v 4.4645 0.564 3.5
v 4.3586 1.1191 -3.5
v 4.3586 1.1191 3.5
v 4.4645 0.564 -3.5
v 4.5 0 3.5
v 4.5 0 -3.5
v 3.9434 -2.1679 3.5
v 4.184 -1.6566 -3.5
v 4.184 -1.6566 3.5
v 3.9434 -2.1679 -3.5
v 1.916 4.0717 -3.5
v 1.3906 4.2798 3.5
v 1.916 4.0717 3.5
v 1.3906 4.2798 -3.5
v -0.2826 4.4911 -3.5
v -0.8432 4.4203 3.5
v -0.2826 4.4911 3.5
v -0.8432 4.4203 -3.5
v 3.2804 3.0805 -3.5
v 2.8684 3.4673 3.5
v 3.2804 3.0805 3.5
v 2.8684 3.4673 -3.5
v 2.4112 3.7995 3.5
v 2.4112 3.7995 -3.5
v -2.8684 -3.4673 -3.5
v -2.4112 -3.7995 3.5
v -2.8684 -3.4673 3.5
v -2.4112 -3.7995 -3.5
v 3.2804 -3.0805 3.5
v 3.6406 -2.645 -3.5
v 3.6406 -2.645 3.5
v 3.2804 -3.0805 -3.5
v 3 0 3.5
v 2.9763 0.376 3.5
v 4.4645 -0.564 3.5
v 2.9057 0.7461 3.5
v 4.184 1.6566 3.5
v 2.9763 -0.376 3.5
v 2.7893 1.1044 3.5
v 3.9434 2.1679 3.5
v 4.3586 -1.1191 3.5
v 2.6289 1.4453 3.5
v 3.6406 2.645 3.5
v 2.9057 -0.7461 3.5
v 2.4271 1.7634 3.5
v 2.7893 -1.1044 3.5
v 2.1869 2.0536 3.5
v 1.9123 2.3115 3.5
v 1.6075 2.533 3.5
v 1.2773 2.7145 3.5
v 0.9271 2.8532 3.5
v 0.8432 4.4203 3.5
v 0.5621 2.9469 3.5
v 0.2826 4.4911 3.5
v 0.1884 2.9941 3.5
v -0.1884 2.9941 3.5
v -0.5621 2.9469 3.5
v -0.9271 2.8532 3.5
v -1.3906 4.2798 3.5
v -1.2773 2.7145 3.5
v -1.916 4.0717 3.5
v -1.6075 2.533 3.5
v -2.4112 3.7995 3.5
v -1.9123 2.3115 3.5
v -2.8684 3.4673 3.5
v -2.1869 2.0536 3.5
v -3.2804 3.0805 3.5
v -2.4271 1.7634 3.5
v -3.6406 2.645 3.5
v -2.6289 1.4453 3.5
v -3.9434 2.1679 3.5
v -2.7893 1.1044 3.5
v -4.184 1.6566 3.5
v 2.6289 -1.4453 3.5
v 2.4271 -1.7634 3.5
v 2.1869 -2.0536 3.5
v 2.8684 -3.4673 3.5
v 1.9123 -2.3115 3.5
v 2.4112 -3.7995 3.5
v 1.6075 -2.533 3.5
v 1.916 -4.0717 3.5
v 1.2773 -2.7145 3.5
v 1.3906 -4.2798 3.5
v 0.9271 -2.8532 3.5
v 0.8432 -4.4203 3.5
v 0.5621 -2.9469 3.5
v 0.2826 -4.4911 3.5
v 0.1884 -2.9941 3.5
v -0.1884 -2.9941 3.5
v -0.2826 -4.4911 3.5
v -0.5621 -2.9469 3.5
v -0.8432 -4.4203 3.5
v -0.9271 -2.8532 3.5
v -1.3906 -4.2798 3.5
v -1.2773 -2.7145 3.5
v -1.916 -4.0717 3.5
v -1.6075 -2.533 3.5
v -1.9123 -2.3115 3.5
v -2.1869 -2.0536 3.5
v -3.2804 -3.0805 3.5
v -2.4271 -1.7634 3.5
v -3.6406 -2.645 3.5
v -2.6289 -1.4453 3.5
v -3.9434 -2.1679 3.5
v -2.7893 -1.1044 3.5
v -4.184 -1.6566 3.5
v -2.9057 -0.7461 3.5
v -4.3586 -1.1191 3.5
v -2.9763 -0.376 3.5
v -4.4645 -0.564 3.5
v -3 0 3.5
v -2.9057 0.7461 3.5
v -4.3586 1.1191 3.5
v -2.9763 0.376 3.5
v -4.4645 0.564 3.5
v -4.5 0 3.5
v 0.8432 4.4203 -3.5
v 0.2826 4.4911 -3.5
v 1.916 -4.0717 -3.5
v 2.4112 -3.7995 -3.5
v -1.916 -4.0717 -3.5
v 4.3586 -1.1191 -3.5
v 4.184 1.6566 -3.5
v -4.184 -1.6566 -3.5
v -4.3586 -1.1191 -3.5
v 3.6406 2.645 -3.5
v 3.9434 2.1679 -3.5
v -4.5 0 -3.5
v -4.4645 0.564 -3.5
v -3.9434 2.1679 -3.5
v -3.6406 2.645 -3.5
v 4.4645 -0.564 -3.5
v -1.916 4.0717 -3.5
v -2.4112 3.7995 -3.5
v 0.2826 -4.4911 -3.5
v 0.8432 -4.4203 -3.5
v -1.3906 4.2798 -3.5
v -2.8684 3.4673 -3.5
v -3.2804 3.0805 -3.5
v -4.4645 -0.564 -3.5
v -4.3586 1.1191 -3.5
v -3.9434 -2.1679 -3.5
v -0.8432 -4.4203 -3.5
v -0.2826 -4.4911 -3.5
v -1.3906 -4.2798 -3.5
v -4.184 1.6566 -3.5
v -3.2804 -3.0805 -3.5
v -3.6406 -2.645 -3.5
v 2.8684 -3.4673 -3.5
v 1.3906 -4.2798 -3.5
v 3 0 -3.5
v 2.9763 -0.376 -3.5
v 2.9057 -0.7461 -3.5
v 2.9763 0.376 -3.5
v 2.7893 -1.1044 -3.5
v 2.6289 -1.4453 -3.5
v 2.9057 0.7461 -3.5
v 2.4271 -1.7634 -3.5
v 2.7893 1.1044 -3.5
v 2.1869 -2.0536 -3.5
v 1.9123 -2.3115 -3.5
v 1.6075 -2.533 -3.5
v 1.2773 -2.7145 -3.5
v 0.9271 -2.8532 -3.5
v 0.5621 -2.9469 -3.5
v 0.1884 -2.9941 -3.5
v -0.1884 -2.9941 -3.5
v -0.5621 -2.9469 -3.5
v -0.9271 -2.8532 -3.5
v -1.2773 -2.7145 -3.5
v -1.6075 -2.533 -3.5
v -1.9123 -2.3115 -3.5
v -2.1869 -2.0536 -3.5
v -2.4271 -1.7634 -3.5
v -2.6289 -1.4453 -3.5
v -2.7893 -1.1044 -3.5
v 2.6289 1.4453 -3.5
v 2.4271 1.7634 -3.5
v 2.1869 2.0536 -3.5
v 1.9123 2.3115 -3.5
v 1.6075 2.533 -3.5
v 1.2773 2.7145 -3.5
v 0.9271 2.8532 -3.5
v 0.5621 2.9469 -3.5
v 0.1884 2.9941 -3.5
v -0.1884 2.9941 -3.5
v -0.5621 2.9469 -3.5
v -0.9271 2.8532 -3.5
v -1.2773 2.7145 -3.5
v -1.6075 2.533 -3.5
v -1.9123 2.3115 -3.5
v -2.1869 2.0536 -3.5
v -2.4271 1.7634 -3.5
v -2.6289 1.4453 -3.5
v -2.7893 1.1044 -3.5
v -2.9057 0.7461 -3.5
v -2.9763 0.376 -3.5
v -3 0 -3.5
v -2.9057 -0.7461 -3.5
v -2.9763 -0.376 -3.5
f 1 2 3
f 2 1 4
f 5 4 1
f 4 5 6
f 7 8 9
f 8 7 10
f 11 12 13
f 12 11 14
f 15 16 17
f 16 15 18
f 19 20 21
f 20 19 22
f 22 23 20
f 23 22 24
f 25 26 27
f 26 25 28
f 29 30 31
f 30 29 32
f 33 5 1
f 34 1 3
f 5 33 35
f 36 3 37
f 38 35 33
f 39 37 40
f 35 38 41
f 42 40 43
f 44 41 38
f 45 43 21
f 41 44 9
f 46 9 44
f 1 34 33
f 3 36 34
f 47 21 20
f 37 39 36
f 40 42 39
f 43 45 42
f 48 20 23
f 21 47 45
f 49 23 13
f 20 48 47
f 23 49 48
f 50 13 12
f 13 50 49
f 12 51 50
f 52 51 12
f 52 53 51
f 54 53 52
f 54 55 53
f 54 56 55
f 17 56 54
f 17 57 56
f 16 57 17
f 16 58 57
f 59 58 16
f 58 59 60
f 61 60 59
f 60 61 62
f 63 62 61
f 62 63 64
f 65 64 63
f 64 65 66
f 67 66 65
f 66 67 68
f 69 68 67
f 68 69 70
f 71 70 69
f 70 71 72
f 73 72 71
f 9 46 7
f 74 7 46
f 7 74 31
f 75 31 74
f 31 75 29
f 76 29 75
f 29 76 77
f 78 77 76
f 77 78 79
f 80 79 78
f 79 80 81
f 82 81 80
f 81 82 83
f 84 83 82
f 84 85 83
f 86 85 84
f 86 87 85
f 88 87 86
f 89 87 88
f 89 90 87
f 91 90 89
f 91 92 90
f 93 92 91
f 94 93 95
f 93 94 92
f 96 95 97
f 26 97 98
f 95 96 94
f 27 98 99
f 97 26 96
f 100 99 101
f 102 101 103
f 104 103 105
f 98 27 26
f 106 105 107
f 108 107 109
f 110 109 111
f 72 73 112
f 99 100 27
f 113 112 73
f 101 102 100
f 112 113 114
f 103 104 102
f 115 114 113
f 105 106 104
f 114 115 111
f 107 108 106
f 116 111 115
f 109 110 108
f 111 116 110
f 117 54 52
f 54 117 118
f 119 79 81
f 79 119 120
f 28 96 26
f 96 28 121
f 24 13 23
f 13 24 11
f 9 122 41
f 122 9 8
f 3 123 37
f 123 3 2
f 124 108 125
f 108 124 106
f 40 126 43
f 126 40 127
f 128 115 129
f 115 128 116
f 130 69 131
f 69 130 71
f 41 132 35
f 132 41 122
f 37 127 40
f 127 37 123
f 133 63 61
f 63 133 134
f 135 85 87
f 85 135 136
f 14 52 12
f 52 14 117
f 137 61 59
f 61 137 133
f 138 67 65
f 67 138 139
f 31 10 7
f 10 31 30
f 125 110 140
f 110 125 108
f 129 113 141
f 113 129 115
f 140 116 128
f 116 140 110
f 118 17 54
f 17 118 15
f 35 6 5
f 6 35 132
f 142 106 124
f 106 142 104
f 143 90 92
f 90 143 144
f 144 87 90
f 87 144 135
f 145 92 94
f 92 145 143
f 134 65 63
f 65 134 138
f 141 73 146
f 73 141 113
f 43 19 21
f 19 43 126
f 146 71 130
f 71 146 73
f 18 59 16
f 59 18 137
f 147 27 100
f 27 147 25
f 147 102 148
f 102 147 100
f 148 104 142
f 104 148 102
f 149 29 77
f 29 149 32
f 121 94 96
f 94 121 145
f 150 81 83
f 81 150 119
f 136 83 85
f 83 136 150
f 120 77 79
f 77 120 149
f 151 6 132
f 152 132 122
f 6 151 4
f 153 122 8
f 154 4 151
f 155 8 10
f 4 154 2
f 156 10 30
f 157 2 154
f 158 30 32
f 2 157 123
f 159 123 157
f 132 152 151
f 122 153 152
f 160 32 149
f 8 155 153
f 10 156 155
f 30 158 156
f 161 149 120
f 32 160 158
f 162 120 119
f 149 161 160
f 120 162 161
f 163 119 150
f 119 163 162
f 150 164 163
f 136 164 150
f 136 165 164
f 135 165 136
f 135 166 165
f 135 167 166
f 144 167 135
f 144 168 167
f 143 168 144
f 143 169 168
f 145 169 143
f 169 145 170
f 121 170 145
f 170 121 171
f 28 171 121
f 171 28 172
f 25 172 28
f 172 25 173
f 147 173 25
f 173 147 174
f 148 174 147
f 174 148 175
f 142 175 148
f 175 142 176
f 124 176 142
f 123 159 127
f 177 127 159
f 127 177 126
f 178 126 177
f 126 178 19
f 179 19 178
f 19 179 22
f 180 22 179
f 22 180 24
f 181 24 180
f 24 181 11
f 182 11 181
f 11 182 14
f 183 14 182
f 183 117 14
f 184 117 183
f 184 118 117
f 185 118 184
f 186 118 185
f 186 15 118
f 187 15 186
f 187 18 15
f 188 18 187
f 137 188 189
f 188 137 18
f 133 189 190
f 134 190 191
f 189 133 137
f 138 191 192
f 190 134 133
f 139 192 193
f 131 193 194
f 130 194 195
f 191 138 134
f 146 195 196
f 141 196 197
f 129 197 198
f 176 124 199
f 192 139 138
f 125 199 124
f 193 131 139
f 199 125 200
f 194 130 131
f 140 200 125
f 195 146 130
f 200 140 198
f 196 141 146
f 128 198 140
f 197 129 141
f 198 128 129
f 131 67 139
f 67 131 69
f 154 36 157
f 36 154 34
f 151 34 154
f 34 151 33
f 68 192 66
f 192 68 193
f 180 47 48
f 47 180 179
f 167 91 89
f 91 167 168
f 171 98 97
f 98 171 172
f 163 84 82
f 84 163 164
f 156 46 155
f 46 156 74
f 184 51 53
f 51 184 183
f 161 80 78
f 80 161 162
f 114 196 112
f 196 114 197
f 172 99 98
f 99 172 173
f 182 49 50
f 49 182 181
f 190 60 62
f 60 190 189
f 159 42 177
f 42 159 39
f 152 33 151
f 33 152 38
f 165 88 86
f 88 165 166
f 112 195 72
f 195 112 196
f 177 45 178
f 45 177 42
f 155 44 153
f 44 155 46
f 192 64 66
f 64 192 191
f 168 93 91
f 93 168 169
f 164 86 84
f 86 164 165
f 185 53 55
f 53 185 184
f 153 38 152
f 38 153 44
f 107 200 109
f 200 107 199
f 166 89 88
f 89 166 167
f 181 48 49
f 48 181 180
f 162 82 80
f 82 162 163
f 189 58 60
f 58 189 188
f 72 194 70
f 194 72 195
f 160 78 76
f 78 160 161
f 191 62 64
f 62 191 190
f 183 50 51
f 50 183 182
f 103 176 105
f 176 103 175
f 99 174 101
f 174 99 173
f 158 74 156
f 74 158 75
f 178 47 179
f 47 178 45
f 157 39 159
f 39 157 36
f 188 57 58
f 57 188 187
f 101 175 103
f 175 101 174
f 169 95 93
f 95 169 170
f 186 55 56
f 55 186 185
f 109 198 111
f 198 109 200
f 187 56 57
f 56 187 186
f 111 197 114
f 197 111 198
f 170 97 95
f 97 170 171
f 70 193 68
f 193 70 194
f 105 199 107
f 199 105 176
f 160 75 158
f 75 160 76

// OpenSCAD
$fn = 50;


difference() {
	union() {
		translate(v = [0, 0, -3.5000000000]) {
			cylinder(h = 7, r = 4.5000000000);
		}
	}
	union() {
		translate(v = [0, 0, -100.0000000000]) {
			cylinder(h = 200, r = 3.0000000000);
		}
	}
}
